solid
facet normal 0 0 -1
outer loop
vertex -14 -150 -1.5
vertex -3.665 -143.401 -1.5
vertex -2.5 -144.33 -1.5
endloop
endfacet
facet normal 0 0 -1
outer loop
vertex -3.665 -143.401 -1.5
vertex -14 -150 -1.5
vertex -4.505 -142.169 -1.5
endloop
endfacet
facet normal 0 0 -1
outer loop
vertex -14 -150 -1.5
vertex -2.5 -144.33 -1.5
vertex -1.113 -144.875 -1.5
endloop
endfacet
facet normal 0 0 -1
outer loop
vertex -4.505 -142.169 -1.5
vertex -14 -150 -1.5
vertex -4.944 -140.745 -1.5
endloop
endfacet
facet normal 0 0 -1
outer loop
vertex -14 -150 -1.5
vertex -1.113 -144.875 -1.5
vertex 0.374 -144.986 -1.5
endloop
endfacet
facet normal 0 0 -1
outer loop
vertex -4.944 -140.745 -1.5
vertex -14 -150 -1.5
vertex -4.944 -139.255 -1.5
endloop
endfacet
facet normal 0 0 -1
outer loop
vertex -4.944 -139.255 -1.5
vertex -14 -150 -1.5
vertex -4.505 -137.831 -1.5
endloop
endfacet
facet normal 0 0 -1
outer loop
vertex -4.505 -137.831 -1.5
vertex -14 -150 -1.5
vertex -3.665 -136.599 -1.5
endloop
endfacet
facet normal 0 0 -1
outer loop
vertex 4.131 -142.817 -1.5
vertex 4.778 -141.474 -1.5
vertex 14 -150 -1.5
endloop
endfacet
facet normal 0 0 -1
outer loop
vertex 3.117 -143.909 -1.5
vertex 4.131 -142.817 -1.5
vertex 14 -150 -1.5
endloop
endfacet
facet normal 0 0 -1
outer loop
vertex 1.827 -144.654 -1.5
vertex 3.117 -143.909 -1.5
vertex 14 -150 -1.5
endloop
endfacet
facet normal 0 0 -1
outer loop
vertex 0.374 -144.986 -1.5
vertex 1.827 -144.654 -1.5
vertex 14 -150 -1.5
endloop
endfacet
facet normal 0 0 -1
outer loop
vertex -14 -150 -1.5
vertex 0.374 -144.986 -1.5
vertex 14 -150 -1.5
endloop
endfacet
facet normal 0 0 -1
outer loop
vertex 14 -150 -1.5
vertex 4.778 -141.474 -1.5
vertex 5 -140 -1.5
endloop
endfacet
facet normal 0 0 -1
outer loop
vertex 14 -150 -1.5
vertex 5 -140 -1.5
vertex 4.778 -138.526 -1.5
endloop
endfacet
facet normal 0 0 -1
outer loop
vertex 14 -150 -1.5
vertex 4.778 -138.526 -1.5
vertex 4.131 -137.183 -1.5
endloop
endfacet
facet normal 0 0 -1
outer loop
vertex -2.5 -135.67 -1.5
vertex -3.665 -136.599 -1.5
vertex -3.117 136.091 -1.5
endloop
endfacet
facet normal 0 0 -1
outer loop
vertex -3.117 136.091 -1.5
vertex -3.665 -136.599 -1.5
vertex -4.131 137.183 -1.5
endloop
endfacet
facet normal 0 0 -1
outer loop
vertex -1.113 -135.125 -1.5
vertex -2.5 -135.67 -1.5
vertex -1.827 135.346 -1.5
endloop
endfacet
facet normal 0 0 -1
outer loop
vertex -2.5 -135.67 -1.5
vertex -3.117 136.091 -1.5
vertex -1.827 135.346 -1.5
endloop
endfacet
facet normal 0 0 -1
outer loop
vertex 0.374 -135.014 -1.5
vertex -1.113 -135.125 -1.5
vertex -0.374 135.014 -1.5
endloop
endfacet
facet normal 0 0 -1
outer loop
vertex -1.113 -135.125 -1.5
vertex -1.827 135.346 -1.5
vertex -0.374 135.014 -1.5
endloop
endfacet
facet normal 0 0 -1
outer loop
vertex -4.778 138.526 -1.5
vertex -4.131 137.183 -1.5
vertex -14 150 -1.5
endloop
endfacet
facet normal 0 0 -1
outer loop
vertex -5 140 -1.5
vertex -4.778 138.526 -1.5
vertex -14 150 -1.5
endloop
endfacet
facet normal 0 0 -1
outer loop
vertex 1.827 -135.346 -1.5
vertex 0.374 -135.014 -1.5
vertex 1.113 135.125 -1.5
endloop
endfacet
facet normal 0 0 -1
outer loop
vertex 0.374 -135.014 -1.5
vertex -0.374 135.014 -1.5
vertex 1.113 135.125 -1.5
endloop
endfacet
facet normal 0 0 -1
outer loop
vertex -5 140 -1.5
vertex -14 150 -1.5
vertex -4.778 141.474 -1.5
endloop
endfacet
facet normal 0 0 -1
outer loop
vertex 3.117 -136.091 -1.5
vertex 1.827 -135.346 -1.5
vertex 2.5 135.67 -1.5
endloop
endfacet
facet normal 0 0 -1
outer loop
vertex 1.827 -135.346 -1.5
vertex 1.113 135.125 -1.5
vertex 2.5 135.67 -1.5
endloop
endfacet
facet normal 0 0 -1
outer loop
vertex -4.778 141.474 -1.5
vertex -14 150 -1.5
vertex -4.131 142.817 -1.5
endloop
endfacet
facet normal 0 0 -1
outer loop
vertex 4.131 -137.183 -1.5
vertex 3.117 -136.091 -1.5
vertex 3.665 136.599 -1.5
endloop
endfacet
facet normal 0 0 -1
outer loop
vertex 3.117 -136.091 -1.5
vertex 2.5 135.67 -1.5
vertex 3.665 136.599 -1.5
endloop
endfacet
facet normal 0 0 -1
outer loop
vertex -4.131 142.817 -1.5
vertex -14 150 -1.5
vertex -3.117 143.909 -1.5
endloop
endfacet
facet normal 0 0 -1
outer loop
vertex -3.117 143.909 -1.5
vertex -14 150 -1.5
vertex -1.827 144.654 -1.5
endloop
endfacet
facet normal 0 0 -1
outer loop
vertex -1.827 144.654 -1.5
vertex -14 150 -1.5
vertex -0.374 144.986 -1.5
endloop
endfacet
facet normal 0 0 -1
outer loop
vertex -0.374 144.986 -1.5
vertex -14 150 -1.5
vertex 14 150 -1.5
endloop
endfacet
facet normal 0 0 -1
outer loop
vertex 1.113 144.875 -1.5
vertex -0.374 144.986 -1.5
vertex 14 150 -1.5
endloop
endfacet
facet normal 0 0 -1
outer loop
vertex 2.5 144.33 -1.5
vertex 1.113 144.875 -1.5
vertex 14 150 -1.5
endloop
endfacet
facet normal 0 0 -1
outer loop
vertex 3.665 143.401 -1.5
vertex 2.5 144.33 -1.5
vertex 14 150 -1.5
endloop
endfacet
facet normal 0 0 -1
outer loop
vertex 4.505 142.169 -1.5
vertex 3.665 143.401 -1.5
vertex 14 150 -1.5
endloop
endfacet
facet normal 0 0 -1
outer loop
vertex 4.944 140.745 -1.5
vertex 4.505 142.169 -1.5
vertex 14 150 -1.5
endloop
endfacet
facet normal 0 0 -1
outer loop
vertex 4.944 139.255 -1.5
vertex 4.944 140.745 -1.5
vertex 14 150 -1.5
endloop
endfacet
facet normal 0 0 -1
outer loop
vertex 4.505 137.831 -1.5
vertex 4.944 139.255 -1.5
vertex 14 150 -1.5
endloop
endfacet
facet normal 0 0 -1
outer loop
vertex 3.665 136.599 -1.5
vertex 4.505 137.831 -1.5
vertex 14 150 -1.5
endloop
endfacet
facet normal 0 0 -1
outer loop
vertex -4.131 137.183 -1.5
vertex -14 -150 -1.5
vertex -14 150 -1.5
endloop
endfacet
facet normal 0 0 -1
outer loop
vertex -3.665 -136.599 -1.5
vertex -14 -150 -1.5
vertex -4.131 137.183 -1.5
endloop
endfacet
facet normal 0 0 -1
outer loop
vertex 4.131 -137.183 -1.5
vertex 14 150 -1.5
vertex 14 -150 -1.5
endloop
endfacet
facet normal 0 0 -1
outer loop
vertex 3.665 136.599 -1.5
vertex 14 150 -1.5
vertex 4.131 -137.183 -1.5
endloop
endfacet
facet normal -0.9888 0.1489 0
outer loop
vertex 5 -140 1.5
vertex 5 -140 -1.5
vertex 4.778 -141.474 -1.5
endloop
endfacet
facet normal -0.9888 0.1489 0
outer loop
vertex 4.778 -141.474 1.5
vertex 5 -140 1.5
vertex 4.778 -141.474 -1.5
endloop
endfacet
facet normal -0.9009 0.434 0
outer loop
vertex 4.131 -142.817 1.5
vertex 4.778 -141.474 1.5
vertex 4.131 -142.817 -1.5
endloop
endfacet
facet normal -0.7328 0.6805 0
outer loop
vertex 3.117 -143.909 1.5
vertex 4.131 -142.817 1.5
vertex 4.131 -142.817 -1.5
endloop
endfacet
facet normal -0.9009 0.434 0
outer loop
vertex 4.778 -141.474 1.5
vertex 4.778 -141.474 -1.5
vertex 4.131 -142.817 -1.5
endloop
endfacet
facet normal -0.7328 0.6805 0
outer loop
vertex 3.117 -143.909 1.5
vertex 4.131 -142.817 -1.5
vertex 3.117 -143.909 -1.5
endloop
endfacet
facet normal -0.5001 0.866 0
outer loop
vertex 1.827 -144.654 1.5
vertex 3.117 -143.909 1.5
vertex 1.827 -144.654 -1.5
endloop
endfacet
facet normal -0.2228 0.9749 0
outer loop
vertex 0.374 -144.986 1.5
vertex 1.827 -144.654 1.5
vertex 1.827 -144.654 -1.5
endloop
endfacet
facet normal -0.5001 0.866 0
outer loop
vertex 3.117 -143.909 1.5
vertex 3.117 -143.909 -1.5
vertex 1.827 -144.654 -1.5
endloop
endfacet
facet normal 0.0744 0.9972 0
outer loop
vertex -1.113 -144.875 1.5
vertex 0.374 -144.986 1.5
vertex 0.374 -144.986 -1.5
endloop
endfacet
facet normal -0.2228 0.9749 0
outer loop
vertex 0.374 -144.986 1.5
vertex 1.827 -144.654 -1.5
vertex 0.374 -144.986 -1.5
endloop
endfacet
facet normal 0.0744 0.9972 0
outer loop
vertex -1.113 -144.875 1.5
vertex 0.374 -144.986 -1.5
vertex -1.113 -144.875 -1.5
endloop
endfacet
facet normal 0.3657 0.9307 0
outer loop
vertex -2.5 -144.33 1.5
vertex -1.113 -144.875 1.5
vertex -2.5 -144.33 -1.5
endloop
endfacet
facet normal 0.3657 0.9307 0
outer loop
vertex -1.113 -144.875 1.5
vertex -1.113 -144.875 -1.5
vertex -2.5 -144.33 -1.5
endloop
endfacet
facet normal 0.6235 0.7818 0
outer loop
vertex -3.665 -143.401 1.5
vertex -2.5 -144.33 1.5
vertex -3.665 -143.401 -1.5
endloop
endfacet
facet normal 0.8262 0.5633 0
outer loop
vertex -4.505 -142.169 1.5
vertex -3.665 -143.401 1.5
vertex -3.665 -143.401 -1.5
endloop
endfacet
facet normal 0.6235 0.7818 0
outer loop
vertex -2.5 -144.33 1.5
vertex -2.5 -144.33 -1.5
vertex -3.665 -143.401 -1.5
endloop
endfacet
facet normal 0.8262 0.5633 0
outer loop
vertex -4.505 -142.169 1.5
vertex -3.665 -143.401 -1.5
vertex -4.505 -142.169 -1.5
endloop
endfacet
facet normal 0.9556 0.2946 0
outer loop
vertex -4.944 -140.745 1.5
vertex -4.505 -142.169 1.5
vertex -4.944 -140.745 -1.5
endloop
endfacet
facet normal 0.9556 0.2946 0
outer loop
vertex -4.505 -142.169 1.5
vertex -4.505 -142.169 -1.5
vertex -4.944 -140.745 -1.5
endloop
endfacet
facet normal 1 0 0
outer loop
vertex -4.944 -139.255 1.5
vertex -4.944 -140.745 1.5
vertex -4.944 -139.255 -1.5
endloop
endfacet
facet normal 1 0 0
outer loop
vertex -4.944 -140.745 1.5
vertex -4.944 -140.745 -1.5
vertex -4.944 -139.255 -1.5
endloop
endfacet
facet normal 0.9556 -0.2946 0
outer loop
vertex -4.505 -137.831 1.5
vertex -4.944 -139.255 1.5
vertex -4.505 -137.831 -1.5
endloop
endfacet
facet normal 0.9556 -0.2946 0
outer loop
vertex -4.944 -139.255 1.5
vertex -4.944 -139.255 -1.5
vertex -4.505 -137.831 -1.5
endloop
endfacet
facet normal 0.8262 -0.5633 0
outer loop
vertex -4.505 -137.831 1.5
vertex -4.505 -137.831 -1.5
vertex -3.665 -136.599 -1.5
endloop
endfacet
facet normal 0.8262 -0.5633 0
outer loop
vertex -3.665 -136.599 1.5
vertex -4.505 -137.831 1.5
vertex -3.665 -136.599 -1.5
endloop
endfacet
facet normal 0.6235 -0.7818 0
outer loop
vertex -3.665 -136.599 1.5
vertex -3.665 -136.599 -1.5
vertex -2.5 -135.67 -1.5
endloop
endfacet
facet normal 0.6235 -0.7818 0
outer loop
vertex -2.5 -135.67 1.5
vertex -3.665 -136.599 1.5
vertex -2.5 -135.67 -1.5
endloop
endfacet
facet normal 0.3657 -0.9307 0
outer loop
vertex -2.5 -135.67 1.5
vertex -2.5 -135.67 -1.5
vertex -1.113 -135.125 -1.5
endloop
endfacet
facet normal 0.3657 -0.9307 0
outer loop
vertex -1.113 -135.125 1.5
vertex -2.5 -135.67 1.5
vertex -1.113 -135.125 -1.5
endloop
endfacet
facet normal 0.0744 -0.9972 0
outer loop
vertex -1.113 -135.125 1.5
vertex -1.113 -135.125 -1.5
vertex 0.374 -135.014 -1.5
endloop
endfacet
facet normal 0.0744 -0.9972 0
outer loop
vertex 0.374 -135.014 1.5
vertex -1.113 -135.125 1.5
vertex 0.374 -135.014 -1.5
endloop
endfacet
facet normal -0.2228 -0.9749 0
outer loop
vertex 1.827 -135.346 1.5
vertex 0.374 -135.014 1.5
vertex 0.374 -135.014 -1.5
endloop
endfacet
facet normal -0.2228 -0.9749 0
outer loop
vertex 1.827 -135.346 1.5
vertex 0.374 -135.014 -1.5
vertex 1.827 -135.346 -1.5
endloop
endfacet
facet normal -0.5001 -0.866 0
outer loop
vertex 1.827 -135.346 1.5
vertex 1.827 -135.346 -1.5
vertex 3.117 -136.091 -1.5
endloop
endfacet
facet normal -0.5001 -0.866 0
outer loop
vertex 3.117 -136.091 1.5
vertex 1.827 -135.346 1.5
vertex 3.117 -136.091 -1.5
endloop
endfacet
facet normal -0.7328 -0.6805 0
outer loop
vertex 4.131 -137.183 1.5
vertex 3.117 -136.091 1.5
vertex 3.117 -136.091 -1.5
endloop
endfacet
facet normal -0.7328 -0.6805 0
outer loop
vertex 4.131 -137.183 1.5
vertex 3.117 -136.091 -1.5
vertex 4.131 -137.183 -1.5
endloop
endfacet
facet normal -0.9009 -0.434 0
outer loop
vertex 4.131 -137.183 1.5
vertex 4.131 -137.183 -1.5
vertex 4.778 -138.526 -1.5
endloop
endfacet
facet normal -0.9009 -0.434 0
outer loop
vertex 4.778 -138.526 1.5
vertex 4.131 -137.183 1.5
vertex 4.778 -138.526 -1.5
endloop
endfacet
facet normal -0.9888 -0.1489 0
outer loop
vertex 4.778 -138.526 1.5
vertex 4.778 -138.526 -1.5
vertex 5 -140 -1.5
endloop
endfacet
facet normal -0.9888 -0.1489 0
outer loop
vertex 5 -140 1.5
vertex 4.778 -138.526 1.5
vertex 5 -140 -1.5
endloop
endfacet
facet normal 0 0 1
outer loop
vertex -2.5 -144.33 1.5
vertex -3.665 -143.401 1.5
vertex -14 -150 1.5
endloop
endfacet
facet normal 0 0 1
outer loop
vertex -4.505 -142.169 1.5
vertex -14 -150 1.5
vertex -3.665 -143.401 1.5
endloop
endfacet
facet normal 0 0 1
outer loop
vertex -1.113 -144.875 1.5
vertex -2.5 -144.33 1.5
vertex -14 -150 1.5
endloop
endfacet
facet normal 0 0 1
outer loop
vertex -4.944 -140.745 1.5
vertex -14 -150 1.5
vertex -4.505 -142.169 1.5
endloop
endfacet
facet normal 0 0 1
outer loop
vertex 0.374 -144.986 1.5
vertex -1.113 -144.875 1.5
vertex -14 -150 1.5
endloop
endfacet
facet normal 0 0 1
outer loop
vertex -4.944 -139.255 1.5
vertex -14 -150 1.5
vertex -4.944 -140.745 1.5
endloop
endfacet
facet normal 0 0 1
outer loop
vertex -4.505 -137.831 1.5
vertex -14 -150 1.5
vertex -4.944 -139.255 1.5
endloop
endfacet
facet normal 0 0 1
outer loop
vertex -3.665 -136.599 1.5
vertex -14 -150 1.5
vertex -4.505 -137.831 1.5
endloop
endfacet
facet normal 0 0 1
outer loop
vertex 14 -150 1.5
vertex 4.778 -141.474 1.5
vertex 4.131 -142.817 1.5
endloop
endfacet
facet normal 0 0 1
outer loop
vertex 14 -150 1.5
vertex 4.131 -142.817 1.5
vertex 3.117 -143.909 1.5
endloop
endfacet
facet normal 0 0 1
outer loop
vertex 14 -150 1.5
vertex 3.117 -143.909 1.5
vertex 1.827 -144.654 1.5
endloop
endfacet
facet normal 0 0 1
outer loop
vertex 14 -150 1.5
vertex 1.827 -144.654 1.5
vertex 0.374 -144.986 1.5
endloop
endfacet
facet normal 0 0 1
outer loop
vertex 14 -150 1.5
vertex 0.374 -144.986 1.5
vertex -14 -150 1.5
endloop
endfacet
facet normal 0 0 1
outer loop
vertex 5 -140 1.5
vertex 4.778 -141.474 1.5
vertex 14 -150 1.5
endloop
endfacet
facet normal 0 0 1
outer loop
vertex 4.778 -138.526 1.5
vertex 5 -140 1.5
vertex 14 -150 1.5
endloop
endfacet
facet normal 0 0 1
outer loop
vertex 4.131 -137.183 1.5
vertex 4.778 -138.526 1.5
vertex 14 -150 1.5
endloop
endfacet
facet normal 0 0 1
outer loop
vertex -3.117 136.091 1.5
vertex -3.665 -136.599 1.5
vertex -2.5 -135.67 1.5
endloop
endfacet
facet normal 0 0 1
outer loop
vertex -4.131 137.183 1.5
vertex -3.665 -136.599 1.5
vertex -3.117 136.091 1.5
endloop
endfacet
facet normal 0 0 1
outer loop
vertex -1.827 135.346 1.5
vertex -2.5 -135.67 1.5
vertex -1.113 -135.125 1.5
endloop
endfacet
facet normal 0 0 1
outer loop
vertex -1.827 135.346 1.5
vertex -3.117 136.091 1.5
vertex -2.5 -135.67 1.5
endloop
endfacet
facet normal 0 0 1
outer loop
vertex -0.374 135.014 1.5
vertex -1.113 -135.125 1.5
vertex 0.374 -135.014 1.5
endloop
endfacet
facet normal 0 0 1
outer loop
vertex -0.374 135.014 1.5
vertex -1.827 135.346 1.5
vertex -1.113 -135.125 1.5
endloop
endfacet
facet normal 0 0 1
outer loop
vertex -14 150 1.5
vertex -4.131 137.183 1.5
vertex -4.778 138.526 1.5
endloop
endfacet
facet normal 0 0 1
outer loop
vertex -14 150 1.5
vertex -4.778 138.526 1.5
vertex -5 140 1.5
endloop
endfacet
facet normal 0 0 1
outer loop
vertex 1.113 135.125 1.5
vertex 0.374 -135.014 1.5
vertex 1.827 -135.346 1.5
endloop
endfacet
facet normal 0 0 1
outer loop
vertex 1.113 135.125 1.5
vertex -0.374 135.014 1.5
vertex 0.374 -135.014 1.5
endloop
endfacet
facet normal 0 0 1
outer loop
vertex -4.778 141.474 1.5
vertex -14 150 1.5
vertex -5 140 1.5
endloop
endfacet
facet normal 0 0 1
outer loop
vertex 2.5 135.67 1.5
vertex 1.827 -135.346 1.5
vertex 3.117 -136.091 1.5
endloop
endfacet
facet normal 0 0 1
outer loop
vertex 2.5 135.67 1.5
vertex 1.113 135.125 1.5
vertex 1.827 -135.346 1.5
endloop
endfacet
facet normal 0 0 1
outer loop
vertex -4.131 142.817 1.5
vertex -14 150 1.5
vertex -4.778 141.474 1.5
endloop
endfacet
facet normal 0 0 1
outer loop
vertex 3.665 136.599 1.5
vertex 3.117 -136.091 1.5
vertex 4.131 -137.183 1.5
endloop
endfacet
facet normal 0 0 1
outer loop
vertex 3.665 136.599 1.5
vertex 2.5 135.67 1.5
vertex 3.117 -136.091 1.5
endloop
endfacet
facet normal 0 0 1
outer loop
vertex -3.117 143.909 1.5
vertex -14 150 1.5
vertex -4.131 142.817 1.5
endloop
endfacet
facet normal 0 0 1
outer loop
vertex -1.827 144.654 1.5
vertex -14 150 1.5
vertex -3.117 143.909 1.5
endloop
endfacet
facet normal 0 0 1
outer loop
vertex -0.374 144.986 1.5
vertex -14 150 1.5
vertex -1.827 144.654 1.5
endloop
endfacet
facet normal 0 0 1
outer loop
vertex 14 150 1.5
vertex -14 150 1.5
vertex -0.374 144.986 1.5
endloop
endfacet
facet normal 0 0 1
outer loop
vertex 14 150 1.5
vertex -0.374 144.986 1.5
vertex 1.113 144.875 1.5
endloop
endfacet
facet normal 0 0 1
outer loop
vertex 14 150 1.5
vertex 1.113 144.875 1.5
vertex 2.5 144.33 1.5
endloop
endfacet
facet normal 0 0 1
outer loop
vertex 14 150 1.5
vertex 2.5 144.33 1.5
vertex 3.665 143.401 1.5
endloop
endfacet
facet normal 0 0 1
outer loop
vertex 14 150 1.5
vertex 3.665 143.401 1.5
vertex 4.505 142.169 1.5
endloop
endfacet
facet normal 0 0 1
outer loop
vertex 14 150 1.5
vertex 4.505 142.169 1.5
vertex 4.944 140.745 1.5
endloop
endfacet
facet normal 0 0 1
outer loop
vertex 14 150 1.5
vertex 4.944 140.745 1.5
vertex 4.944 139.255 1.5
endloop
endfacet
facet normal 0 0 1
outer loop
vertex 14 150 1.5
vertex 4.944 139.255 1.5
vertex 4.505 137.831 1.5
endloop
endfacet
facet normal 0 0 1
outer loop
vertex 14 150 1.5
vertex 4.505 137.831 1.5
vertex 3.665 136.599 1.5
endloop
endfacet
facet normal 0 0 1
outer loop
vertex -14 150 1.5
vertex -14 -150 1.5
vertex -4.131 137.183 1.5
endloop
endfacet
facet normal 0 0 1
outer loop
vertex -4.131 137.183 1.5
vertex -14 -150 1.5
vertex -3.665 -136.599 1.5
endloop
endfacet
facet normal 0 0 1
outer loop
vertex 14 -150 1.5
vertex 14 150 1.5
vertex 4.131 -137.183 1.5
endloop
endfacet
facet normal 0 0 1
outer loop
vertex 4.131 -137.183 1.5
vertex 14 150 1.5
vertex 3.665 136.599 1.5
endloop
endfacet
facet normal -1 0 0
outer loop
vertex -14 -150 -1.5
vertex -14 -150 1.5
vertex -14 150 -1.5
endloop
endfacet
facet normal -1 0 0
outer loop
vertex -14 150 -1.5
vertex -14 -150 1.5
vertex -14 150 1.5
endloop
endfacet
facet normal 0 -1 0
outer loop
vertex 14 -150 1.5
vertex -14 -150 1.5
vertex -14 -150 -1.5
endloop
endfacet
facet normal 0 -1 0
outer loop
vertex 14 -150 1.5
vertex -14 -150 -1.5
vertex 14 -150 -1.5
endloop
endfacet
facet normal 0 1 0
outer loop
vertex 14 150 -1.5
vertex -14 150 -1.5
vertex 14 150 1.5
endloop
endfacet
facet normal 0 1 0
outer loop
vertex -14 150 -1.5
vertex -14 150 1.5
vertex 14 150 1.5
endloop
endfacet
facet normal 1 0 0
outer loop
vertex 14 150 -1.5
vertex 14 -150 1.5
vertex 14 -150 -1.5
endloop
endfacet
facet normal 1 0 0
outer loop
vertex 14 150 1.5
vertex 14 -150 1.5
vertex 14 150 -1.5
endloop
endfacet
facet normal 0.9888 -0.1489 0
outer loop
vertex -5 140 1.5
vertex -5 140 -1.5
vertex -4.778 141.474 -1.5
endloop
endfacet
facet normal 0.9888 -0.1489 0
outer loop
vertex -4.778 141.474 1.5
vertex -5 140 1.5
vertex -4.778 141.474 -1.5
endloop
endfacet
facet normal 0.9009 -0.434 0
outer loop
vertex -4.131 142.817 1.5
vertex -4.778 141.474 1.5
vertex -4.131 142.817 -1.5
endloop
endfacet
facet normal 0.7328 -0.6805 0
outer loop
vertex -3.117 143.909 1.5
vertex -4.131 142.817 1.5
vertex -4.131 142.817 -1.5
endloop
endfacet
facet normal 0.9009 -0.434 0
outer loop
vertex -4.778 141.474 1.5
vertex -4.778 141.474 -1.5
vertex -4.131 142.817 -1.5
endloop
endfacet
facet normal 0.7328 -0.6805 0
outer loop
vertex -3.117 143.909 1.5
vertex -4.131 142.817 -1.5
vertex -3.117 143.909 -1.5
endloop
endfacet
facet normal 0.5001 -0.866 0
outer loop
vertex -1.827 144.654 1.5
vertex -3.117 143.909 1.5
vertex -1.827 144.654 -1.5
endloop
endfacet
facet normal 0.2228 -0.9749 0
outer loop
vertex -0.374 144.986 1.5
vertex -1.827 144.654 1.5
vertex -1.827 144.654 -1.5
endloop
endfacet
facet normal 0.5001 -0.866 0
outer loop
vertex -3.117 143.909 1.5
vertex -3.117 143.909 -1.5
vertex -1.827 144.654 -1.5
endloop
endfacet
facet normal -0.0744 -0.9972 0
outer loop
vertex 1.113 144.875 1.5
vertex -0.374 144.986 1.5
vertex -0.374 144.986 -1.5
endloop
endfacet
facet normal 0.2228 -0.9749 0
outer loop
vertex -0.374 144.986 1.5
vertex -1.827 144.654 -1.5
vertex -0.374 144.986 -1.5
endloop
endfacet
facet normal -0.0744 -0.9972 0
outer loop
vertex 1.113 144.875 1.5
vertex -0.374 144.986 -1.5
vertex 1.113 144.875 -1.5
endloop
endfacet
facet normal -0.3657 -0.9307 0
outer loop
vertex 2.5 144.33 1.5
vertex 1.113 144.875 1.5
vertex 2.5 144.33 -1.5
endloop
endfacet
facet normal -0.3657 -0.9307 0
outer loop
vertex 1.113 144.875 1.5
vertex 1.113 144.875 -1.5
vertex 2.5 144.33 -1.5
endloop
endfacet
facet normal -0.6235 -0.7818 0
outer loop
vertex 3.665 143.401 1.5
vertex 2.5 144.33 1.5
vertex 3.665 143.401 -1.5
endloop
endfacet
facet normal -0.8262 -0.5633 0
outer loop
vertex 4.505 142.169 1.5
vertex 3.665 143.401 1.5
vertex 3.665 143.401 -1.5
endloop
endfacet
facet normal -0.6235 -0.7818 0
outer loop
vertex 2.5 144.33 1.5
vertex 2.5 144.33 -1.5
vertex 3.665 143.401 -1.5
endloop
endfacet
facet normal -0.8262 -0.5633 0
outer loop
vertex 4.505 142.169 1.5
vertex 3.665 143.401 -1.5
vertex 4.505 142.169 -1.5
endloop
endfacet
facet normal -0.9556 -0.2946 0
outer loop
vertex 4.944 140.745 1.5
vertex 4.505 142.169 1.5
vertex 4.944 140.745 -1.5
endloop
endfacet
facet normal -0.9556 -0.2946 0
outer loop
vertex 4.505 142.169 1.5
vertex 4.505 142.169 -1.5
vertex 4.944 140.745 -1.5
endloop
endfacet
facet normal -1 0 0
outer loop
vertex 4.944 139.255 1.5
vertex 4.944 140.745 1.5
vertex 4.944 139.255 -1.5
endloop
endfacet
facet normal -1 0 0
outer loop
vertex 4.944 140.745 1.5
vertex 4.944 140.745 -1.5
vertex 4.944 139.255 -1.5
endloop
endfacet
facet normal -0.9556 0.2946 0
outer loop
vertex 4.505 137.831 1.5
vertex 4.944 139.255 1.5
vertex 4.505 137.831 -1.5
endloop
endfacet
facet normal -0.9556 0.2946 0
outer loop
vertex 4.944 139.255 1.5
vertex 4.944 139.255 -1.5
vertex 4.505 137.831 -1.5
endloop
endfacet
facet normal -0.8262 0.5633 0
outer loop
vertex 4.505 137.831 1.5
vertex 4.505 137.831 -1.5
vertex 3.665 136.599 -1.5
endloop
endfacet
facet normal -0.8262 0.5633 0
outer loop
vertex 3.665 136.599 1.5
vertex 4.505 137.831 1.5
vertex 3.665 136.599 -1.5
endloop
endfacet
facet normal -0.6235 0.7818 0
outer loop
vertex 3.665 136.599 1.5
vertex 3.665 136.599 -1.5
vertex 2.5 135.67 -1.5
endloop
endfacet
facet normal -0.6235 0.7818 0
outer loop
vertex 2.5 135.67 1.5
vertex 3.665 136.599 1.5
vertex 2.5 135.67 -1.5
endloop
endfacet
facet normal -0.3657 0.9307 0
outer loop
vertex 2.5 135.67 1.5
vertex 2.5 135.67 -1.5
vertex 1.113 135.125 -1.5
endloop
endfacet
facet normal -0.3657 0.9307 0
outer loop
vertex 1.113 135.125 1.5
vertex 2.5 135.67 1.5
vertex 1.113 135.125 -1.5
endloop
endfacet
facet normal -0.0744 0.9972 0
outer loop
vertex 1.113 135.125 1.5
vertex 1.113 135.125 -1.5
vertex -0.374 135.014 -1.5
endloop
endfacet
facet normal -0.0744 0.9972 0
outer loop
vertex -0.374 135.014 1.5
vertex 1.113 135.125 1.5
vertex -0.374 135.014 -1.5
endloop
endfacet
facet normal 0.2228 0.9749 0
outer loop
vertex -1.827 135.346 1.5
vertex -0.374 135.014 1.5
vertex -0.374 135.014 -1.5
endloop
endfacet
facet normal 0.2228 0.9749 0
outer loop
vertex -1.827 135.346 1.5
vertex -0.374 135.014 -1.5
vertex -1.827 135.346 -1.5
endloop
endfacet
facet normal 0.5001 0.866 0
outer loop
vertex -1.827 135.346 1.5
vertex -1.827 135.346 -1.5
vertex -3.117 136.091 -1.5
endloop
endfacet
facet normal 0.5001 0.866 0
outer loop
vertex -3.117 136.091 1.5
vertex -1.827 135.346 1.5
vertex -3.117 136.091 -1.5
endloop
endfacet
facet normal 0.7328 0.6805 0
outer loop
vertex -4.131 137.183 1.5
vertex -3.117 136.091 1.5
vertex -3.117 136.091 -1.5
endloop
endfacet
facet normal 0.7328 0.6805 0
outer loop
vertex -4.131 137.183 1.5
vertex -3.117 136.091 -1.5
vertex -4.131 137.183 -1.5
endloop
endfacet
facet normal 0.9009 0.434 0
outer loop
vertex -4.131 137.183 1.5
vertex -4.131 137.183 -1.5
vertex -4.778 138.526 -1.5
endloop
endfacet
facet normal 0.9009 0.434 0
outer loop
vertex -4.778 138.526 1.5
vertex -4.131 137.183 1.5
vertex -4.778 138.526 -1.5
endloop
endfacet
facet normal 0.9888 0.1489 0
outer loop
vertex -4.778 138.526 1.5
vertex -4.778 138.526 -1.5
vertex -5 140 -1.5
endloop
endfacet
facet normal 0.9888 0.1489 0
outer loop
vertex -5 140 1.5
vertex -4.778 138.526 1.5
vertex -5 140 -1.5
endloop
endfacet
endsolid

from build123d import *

# Parameters (mm, degrees)
CROQUIS1_W              = 28
CROQUIS1_H              = 300
SALIENTE_EXTRUIR1_DEPTH = 1.5
CROQUIS2_R              = 5
CORTAR_EXTRUIR1_DEPTH   = 151.681783902


with BuildPart() as part:
    # Croquis1 → Saliente-Extruir1 (new, symmetric)
    with BuildSketch(Plane.XY):
        Rectangle(CROQUIS1_W, CROQUIS1_H)
    extrude(amount=SALIENTE_EXTRUIR1_DEPTH, both=True)

    # Croquis2 → Cortar-Extruir1 (cut, through all)
    with BuildSketch(Plane(origin=(0, 0, -1.5), x_dir=(-1, 0, 0), z_dir=(0, 0, -1))):
        with Locations((0, 140)):
            Circle(CROQUIS2_R)
        with Locations(Location((0, -140, 0), (0, 0, 180))):
            Circle(CROQUIS2_R)
    extrude(amount=-CORTAR_EXTRUIR1_DEPTH, mode=Mode.SUBTRACT)


solid = part.part
